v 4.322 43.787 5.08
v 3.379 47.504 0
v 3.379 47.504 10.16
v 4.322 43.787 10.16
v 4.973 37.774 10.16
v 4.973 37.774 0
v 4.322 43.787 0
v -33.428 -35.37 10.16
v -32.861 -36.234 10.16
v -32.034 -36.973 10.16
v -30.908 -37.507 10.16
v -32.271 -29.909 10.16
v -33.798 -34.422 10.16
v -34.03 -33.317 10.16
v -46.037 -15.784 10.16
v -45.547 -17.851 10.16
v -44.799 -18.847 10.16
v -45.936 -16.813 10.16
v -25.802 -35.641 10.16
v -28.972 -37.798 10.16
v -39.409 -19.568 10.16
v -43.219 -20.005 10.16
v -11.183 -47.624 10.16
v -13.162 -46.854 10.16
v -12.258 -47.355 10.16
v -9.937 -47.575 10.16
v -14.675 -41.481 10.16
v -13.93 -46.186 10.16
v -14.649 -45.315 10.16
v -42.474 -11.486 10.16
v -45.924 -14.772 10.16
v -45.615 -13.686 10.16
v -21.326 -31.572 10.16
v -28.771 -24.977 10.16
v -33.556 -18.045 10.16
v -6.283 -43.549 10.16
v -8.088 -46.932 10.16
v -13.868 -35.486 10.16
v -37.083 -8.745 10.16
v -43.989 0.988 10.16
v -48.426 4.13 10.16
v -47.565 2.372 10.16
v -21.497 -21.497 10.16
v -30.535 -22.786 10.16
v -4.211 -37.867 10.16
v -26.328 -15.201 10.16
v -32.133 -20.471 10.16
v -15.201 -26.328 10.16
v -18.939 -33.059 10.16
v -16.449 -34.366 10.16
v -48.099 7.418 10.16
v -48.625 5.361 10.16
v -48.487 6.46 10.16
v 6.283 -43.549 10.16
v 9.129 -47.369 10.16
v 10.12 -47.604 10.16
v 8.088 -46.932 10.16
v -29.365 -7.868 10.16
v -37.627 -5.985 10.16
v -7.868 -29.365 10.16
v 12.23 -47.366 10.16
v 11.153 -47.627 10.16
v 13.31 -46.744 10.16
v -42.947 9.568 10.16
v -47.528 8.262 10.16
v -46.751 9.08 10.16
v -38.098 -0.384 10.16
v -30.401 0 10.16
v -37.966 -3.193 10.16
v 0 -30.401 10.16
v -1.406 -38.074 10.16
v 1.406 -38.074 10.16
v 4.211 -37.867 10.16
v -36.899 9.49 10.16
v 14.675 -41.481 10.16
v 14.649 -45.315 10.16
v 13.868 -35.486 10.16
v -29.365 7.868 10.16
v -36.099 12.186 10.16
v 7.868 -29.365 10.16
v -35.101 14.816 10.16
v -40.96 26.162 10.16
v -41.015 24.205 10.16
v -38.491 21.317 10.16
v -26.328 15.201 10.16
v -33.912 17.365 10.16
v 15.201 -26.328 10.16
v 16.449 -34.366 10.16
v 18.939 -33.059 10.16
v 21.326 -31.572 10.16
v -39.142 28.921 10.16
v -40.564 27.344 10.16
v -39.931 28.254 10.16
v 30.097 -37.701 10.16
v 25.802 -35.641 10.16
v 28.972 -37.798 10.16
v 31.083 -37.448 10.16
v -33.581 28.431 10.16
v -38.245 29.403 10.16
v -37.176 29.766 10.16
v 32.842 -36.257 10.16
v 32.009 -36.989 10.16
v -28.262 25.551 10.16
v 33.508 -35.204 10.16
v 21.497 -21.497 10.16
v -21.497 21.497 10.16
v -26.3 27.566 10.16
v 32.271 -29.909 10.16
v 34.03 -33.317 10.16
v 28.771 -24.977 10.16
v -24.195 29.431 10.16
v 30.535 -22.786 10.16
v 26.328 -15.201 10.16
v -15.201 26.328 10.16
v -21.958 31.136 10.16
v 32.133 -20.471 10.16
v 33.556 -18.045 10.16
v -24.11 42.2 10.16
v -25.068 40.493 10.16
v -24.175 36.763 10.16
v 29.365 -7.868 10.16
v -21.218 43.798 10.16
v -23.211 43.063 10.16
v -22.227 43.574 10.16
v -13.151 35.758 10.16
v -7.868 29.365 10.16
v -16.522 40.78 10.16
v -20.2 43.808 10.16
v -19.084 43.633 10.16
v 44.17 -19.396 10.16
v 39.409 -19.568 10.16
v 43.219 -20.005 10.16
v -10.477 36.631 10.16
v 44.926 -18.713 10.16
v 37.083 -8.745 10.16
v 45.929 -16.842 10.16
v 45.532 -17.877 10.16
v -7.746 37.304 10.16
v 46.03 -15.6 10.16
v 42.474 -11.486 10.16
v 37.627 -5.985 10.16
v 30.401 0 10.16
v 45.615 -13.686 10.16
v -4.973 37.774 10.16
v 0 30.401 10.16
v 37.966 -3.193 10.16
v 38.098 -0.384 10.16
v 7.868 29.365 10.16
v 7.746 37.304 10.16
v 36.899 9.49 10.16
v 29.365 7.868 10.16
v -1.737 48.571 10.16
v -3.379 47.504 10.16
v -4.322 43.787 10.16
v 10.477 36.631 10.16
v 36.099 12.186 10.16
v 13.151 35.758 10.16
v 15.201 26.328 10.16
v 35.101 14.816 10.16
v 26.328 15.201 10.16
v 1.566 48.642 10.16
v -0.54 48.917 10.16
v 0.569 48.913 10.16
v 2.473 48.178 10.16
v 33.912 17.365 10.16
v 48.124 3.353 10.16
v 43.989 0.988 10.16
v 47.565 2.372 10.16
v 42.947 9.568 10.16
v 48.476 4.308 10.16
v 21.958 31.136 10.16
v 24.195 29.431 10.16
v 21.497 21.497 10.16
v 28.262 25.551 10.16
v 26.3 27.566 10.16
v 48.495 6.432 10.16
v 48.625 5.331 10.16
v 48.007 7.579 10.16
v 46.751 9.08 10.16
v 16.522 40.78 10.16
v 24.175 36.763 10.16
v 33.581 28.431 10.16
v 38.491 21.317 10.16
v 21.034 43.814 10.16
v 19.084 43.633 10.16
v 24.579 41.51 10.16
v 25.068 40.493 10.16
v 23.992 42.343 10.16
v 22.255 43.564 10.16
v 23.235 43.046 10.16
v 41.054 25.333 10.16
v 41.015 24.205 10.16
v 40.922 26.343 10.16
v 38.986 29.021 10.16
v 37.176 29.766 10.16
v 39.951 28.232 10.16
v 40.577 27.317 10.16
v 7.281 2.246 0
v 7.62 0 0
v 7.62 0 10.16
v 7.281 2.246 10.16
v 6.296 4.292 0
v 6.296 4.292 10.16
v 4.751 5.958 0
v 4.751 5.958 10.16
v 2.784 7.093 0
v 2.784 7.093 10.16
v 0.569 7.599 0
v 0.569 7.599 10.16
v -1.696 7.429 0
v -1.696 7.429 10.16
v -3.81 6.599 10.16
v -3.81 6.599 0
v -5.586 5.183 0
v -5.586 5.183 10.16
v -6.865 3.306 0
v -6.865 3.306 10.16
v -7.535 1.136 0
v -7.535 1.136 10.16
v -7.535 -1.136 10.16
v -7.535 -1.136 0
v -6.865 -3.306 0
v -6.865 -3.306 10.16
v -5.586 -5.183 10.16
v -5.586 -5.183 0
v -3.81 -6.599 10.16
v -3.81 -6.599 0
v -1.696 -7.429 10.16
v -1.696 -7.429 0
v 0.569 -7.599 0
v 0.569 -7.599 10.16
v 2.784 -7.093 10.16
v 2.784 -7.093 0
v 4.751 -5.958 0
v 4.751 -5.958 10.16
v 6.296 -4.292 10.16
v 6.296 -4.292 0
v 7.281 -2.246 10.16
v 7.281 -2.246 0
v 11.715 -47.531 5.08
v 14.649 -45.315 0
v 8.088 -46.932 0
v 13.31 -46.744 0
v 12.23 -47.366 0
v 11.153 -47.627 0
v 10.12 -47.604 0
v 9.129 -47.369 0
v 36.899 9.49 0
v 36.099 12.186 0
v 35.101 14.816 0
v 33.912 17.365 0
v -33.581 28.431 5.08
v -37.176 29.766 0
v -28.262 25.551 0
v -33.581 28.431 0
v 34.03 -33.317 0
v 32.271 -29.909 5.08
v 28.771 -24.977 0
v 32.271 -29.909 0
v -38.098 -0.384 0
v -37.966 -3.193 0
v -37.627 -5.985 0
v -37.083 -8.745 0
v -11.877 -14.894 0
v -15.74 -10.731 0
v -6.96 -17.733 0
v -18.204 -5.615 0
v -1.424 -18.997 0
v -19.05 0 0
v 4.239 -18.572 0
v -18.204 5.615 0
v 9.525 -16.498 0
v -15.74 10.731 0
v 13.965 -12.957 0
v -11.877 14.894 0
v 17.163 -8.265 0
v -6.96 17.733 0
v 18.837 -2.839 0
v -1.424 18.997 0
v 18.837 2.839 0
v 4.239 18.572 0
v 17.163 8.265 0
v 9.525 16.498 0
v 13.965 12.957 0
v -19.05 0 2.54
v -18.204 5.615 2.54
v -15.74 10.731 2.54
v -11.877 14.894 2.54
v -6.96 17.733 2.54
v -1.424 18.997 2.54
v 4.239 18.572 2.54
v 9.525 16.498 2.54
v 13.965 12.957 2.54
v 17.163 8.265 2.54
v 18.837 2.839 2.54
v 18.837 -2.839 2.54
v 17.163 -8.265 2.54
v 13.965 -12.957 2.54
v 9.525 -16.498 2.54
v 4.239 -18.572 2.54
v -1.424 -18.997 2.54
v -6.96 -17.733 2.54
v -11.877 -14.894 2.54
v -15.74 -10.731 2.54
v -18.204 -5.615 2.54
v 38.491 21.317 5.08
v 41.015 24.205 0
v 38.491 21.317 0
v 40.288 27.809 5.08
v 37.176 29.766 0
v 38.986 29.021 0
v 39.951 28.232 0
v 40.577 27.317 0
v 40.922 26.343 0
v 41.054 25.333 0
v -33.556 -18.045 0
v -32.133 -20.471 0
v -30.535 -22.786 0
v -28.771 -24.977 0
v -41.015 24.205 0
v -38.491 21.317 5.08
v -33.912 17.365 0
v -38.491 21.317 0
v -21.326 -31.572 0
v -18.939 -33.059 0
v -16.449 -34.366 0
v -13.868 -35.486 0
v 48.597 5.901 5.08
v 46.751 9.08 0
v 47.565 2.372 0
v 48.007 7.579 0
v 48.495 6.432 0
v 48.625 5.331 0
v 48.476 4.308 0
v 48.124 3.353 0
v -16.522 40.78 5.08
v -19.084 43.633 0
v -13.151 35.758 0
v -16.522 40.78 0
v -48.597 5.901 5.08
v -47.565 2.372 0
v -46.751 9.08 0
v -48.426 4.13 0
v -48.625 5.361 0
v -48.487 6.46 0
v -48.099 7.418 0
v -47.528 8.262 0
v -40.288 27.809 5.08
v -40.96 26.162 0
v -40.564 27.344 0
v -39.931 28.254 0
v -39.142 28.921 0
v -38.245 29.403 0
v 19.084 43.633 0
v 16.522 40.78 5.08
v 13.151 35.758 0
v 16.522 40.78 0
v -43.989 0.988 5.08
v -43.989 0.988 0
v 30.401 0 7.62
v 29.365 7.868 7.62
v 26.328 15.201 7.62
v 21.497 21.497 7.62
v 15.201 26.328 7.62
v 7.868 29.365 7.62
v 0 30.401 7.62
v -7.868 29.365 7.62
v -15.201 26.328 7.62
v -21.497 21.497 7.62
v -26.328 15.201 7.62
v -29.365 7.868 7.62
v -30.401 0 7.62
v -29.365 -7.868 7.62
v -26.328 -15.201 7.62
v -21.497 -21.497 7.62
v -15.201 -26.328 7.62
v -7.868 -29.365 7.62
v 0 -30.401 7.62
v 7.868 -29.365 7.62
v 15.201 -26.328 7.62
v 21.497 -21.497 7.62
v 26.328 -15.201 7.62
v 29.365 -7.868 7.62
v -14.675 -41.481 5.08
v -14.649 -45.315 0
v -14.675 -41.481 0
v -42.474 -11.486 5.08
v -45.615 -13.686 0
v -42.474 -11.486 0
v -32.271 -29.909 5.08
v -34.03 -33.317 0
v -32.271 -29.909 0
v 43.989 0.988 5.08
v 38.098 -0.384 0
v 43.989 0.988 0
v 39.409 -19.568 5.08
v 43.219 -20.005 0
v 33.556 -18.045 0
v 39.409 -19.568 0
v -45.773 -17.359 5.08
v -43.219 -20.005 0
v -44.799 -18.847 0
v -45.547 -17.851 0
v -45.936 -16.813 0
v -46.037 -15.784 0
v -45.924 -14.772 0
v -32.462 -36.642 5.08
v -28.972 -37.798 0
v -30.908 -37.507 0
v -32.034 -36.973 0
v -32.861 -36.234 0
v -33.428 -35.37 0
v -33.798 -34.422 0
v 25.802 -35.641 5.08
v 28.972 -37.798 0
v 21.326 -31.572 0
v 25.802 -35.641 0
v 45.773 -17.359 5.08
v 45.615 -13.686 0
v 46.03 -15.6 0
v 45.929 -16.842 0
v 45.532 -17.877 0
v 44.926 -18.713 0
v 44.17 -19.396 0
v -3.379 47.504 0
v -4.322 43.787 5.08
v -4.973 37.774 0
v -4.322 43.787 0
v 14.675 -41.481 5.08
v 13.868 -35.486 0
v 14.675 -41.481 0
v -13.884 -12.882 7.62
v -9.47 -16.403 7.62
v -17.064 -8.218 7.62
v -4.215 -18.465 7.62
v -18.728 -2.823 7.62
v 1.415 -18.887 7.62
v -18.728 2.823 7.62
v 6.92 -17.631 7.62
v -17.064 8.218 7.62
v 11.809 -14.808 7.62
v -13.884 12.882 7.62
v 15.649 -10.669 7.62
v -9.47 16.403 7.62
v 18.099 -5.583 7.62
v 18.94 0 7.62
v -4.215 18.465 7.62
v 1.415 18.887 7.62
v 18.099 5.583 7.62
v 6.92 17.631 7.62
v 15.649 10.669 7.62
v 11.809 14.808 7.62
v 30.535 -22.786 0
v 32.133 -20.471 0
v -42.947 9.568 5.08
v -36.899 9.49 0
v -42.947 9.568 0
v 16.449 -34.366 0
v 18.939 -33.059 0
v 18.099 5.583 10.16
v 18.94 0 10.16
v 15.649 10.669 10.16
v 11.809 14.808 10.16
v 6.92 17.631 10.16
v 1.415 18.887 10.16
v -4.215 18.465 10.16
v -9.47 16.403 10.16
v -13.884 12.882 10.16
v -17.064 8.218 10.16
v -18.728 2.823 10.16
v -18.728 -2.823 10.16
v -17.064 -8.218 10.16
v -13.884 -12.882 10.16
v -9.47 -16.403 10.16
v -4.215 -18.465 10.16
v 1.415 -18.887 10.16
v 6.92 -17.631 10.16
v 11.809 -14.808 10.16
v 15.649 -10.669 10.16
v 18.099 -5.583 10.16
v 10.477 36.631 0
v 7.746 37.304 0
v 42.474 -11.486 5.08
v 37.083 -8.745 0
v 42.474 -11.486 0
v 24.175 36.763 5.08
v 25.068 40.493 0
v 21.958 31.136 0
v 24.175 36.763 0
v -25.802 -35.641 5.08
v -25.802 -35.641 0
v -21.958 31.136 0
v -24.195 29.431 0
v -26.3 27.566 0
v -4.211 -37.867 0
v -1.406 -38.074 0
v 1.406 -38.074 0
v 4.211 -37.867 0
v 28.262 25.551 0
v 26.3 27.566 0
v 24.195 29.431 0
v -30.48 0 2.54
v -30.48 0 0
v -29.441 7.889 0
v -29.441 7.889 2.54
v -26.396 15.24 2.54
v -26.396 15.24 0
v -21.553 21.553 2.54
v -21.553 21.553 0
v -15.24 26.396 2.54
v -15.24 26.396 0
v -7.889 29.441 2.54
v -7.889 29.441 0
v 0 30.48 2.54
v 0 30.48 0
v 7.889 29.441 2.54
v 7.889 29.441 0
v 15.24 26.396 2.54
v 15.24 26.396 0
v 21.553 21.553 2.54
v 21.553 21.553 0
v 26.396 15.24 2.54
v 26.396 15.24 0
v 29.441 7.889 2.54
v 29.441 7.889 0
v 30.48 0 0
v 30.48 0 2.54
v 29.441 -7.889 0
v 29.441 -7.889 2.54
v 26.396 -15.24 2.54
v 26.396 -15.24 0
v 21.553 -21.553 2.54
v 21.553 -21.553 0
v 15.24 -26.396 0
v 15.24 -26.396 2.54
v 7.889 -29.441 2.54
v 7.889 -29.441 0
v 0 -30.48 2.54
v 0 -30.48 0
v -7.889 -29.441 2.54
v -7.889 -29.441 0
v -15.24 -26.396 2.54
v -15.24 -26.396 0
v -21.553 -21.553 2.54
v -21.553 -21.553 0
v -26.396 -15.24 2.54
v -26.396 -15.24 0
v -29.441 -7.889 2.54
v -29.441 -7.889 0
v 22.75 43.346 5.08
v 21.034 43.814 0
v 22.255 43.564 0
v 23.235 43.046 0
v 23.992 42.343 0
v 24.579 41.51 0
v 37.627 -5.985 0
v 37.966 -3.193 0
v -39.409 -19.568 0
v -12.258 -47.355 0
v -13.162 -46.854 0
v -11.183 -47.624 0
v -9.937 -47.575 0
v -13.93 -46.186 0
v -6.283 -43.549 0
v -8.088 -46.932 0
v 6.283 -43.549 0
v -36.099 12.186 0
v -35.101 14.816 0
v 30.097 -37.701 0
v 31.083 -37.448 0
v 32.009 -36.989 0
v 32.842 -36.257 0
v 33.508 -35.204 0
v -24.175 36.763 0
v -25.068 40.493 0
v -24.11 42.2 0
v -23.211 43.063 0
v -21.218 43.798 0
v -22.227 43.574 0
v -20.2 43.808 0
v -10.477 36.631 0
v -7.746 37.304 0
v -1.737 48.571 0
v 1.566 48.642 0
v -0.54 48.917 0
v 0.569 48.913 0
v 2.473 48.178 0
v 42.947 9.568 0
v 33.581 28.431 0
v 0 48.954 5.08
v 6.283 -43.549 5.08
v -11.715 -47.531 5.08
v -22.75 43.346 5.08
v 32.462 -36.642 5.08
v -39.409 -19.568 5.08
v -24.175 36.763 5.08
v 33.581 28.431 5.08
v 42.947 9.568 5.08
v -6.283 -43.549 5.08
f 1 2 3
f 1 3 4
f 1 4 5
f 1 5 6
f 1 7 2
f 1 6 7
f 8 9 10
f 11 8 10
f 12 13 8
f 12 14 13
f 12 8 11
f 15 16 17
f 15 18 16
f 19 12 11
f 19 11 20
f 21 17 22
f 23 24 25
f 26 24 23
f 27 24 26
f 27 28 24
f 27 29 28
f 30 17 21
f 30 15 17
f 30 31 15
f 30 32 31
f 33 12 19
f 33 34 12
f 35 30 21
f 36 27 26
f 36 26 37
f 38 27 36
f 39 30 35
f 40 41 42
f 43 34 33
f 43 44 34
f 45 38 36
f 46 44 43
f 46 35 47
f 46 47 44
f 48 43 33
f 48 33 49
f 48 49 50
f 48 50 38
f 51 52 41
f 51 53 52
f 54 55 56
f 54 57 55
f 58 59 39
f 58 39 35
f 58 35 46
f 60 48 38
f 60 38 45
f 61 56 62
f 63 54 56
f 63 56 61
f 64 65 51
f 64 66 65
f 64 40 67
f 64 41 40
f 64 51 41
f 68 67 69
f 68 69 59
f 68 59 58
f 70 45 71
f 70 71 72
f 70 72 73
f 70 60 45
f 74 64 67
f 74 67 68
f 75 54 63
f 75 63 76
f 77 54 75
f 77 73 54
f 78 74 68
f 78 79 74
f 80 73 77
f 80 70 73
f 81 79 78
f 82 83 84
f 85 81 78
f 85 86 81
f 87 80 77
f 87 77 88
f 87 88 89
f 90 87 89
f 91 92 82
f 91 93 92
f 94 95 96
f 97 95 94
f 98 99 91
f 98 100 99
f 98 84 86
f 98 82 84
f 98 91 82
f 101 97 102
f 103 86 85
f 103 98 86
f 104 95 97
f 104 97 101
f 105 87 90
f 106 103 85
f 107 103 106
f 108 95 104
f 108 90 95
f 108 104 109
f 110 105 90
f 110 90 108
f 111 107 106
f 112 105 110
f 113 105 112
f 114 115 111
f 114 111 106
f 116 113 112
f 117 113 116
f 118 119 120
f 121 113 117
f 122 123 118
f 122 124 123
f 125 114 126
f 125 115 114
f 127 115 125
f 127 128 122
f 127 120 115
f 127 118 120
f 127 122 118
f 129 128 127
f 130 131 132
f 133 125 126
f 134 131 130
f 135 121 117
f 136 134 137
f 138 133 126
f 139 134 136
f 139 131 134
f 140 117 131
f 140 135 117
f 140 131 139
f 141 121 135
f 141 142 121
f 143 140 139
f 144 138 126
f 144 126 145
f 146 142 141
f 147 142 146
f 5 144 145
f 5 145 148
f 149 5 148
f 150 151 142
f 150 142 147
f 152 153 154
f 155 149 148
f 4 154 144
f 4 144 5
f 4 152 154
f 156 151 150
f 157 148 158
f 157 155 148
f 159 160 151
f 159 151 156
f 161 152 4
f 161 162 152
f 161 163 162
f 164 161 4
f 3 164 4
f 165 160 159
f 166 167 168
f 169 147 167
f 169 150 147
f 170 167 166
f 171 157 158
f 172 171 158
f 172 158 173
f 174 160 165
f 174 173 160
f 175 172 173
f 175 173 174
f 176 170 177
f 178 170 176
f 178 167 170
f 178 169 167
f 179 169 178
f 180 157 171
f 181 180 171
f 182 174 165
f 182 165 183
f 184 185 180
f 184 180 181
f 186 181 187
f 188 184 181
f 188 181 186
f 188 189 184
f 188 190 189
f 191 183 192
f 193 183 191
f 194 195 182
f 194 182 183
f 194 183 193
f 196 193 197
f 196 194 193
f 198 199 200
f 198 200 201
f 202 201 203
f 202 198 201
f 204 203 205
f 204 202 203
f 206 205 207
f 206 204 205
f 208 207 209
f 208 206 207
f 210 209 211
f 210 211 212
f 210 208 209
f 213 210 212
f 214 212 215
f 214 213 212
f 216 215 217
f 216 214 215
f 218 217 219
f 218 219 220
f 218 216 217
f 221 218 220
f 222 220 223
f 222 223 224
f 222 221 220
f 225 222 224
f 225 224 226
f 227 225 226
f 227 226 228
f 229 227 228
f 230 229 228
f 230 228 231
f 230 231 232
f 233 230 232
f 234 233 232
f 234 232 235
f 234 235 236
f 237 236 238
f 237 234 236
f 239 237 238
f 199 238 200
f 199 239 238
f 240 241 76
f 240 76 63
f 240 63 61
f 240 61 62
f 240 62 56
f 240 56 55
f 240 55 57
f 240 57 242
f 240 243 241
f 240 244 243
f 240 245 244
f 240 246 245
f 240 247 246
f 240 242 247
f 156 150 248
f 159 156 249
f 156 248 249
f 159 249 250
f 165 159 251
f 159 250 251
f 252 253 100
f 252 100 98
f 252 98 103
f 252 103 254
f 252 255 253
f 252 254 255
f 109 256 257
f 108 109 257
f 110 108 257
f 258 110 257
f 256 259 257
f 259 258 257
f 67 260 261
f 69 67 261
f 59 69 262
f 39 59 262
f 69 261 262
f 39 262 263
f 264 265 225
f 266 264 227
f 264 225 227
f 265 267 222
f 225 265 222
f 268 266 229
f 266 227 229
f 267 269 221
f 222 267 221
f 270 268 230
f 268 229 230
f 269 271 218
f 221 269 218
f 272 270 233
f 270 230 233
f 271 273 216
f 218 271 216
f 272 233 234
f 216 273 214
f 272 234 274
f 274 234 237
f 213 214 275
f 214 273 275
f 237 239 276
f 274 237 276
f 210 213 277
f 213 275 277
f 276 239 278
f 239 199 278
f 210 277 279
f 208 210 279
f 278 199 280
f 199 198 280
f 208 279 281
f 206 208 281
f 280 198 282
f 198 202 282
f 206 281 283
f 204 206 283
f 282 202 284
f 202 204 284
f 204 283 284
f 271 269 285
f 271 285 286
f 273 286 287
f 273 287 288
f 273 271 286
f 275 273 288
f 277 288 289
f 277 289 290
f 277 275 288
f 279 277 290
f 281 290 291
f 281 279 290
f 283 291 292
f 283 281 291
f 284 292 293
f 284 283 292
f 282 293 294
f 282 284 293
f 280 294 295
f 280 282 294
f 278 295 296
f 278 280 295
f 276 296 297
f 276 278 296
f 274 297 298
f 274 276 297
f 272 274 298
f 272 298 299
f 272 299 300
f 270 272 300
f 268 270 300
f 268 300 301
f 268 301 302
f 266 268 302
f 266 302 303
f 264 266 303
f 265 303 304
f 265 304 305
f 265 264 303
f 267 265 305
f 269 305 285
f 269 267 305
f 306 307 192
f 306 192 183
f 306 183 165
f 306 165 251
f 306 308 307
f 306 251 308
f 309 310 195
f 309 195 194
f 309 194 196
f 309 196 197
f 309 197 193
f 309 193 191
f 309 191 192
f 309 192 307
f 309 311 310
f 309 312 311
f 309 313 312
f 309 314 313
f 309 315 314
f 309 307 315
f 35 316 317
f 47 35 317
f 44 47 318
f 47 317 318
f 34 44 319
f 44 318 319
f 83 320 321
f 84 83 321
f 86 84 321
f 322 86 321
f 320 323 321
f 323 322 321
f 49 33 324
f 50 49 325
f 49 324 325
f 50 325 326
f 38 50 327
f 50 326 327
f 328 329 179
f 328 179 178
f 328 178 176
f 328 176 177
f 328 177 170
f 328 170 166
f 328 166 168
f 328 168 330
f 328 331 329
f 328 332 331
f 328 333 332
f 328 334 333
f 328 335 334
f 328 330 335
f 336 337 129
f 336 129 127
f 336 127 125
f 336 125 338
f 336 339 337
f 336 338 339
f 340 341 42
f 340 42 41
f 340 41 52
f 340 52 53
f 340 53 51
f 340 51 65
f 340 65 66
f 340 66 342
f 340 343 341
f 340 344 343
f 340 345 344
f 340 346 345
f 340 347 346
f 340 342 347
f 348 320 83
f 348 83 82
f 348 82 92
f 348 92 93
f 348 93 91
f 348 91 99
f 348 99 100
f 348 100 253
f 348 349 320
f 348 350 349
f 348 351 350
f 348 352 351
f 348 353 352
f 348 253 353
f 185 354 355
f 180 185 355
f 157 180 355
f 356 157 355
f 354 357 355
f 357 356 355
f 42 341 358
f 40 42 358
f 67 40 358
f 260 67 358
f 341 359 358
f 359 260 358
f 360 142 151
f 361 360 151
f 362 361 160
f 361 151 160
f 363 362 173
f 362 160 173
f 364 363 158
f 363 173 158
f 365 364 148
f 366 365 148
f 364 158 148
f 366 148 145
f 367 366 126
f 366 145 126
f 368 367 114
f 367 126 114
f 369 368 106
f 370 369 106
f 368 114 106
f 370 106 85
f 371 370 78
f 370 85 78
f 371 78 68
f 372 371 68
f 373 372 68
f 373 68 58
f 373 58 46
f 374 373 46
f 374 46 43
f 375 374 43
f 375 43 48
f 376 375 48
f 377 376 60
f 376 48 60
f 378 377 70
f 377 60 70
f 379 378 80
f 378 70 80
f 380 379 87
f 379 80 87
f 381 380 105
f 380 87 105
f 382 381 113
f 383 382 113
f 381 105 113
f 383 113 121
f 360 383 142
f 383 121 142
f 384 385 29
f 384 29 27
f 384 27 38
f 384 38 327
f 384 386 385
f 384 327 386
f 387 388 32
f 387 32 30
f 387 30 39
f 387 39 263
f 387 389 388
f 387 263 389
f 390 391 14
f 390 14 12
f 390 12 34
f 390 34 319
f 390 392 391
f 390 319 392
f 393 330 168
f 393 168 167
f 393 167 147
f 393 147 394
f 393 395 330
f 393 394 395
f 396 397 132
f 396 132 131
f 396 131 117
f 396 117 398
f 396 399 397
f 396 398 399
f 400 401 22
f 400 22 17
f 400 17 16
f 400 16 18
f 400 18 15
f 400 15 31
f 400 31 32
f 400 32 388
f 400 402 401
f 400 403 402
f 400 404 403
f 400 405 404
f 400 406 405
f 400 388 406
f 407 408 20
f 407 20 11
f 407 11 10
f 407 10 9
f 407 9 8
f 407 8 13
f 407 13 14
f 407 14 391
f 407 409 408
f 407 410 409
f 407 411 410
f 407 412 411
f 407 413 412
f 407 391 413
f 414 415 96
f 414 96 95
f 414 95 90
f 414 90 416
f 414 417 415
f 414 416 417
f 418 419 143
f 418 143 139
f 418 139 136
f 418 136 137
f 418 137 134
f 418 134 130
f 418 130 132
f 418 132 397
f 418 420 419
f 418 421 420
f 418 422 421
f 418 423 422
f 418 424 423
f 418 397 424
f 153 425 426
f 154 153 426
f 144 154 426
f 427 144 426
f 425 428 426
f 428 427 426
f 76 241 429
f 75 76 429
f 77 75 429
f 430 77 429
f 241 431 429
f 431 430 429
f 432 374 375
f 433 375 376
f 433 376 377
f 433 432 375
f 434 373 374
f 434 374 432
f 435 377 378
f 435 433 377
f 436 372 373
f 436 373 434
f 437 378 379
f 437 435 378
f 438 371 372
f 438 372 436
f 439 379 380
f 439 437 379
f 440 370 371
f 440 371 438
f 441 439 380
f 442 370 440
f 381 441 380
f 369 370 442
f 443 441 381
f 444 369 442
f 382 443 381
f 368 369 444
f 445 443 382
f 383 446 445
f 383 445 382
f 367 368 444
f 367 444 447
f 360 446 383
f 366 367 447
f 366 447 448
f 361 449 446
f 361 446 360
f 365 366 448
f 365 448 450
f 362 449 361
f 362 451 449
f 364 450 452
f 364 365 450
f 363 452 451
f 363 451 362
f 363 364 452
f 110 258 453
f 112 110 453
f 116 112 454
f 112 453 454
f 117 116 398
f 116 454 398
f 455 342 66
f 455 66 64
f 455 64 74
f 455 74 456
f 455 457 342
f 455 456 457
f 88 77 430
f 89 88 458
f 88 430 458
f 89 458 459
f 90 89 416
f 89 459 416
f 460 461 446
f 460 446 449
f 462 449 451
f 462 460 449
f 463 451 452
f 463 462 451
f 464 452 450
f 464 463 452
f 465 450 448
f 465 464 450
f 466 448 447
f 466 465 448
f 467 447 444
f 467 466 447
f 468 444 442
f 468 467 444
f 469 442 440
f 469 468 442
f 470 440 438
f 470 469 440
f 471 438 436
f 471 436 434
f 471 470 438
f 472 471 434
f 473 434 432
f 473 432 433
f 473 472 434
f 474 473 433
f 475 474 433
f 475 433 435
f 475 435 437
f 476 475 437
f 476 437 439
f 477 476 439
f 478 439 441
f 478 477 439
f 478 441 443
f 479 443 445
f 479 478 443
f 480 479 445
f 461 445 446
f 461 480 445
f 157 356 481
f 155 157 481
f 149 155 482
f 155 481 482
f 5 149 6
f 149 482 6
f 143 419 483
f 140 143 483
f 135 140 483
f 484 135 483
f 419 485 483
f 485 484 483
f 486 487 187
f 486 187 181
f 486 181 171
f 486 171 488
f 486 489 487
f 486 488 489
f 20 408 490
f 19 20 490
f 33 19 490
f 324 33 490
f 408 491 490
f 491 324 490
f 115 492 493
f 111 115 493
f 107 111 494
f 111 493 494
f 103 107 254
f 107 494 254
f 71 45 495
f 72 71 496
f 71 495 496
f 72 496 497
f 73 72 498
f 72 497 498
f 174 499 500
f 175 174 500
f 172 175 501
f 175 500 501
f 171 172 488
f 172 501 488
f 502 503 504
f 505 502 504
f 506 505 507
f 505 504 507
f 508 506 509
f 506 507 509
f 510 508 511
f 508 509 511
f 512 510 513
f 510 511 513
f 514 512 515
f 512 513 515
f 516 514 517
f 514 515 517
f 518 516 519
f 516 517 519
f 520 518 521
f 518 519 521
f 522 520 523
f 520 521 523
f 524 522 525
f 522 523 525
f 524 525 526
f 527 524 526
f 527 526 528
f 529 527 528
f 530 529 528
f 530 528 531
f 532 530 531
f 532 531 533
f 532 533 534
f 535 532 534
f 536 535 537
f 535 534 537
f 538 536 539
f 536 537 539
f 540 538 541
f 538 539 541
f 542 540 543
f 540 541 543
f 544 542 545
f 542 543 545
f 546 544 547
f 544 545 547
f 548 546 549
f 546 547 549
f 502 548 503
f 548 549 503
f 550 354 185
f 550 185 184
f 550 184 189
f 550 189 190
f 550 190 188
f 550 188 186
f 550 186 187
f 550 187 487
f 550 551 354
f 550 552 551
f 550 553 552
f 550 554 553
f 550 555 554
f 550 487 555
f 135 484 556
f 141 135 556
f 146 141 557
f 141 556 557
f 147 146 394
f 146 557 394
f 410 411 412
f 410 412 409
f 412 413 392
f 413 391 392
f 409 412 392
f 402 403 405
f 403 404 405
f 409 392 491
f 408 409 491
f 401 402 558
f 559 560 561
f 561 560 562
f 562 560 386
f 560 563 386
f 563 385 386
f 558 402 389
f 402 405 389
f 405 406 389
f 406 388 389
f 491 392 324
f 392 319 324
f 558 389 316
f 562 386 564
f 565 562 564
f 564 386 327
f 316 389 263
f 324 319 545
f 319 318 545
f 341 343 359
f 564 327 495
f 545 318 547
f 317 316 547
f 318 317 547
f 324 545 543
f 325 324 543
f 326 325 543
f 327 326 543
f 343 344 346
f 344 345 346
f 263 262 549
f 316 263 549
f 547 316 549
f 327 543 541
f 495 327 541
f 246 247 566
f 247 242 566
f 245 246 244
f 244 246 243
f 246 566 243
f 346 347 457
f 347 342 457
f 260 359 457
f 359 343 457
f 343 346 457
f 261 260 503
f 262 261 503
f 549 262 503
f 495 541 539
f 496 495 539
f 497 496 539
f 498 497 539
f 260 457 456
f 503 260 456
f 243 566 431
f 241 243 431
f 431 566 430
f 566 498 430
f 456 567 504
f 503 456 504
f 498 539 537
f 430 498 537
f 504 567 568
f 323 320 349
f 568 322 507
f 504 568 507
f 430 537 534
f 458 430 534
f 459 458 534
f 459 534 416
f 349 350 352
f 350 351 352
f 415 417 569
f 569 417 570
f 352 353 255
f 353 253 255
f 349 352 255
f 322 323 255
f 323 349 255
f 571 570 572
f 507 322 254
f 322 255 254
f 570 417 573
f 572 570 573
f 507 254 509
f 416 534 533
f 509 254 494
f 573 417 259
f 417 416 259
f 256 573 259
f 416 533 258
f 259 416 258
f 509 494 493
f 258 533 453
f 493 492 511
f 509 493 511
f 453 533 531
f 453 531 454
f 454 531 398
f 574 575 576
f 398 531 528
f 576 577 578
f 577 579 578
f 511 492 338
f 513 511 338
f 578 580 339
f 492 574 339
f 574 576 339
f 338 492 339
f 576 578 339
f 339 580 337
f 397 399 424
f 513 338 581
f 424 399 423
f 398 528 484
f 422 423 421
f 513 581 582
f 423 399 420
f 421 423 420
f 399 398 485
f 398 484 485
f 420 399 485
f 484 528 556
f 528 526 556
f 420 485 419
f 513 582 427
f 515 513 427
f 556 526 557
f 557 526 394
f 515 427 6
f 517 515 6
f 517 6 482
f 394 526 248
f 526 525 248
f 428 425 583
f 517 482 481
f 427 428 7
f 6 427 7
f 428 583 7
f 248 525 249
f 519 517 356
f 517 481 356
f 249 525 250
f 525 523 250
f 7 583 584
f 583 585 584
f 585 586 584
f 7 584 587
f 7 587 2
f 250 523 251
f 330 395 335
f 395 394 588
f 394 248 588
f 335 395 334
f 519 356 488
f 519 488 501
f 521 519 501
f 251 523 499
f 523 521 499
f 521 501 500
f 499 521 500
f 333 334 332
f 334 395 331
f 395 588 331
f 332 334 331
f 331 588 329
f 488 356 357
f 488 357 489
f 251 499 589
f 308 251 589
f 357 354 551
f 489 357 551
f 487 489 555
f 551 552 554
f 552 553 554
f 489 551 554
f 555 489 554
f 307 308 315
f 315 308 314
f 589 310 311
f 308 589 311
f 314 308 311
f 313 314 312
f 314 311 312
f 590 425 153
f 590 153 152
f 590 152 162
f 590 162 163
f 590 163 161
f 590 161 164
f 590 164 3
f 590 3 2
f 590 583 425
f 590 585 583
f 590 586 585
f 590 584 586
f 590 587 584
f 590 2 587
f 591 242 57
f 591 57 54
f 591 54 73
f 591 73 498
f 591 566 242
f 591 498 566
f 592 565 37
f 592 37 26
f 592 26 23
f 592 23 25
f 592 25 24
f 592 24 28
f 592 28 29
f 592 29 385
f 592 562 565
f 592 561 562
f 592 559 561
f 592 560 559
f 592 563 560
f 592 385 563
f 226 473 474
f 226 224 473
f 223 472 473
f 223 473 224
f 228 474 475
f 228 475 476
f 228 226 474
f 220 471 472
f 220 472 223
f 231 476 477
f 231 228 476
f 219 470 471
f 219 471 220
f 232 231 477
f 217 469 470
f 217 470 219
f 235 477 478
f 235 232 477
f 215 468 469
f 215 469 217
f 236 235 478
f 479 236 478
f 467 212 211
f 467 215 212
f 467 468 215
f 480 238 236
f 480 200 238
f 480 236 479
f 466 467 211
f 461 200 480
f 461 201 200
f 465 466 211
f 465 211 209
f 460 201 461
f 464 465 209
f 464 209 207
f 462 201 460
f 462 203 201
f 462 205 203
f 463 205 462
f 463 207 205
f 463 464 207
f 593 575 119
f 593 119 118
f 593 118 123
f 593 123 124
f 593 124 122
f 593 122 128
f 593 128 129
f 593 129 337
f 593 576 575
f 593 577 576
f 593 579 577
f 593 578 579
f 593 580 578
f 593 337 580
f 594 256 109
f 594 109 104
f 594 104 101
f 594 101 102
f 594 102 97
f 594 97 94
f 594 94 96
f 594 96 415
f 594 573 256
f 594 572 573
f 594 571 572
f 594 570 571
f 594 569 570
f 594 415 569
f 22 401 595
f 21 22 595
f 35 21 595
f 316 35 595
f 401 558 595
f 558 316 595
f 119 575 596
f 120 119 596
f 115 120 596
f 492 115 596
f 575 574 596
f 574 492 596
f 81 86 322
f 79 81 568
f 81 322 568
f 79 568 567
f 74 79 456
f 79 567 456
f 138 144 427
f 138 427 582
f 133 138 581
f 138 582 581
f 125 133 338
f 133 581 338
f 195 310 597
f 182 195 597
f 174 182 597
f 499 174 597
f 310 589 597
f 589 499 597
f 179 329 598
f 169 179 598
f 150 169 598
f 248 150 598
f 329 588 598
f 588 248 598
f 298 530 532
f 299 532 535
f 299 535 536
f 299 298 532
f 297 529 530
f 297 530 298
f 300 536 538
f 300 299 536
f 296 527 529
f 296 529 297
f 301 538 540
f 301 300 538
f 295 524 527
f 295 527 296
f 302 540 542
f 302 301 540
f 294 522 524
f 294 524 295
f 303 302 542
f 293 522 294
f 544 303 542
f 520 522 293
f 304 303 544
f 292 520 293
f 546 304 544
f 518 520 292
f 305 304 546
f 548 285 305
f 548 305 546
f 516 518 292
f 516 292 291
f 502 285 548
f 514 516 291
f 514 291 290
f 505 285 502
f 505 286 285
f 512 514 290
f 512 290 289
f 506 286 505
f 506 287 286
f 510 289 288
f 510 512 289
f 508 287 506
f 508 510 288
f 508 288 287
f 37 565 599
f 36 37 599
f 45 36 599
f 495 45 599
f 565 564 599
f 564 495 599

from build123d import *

# Parameters (mm, degrees)
SKETCH1_R           = 7.62
BOSS_EXTRUDE2_DEPTH = 10.16
SKETCH2_R           = 30.48
SKETCH2_R_2         = 19.05
CUT_EXTRUDE1_DEPTH  = 2.54
SKETCH4_R           = 30.401229143
SKETCH4_R_2         = 18.940015454
CUT_EXTRUDE3_DEPTH  = 2.54


with BuildPart() as part:
    # Sketch1 → Boss-Extrude2 (new body)
    with BuildSketch(Plane.XY):
        with BuildLine():
            ThreePointArc((-4.973047924, 37.774049218), (-9.117926809, 36.992883244), (-13.151060724, 35.758350099))
            add(Edge.make_bspline(
                [(-19.084474431, 43.633182282), (-16.926977066, 41.864131326), (-13.151060724, 35.758350099)],
                knots=[0, 0, 0, 1, 1, 1], degree=2))
            add(Edge.make_bspline(
                [(-25.068187902, 40.492687188), (-23.423529412, 44.629806533), (-19.084474431, 43.633182282)],
                knots=[0, 0, 0, 1, 1, 1], degree=2))
            add(Edge.make_bspline(
                [(-25.068187902, 40.492687188), (-24.837885701, 37.712166182), (-21.957891223, 31.136168888)],
                knots=[0, 0, 0, 1, 1, 1], degree=2))
            ThreePointArc((-21.957891223, 31.136168888), (-25.264973279, 28.518259505), (-28.262419847, 25.550843908))
            add(Edge.make_bspline(
                [(-37.175813758, 29.766266676), (-34.443325744, 29.202488866), (-28.262419847, 25.550843908)],
                knots=[0, 0, 0, 1, 1, 1], degree=2))
            add(Edge.make_bspline(
                [(-41.014668065, 24.204726066), (-41.481010519, 28.63227423), (-37.175813758, 29.766266676)],
                knots=[0, 0, 0, 1, 1, 1], degree=2))
            add(Edge.make_bspline(
                [(-41.014668065, 24.204726066), (-39.518573051, 21.849723757), (-33.912446265, 17.365367497)],
                knots=[0, 0, 0, 1, 1, 1], degree=2))
            ThreePointArc((-33.912446265, 17.365367497), (-35.624118846, 13.510446196), (-36.899199182, 9.489947298))
            add(Edge.make_bspline(
                [(-46.75062217, 9.080258097), (-44.069123581, 9.850908135), (-36.899199182, 9.489947298)],
                knots=[0, 0, 0, 1, 1, 1], degree=2))
            add(Edge.make_bspline(
                [(-47.565182054, 2.371753901), (-50.035692017, 6.075432957), (-46.75062217, 9.080258097)],
                knots=[0, 0, 0, 1, 1, 1], degree=2))
            add(Edge.make_bspline(
                [(-47.565182054, 2.371753901), (-45.146031566, 0.981772936), (-38.098068557, -0.383630312)],
                knots=[0, 0, 0, 1, 1, 1], degree=2))
            ThreePointArc((-38.098068557, -0.383630312), (-37.822208103, -4.592447518), (-37.082816668, -8.744981872))
            add(Edge.make_bspline(
                [(-45.615426449, -13.685928184), (-43.599216296, -11.757396933), (-37.082816668, -8.744981872)],
                knots=[0, 0, 0, 1, 1, 1], degree=2))
            add(Edge.make_bspline(
                [(-43.219086057, -20.0045585), (-47.12779947, -17.87321679), (-45.615426449, -13.685928184)],
                knots=[0, 0, 0, 1, 1, 1], degree=2))
            add(Edge.make_bspline(
                [(-43.219086057, -20.0045585), (-40.431078318, -20.111090232), (-33.555882474, -18.04474304)],
                knots=[0, 0, 0, 1, 1, 1], degree=2))
            ThreePointArc((-33.555882474, -18.04474304), (-31.355685291, -21.64326685), (-28.771207752, -24.976541083))
            add(Edge.make_bspline(
                [(-34.030286254, -33.31683325), (-33.141253985, -30.672224056), (-28.771207752, -24.976541083)],
                knots=[0, 0, 0, 1, 1, 1], degree=2))
            add(Edge.make_bspline(
                [(-28.972018291, -37.798067629), (-33.423496015, -37.727327965), (-34.030286254, -33.31683325)],
                knots=[0, 0, 0, 1, 1, 1], degree=2))
            add(Edge.make_bspline(
                [(-28.972018291, -37.798067629), (-26.453852274, -36.596744994), (-21.326448108, -31.572022601)],
                knots=[0, 0, 0, 1, 1, 1], degree=2))
            ThreePointArc((-21.326448108, -31.572022601), (-17.705952855, -33.735874577), (-13.868461871, -35.486275732))
            add(Edge.make_bspline(
                [(-14.649217588, -45.315253331), (-15.091029782, -42.560414288), (-13.868461871, -35.486275732)],
                knots=[0, 0, 0, 1, 1, 1], degree=2))
            add(Edge.make_bspline(
                [(-8.087810285, -46.932494981), (-12.06227242, -48.938562968), (-14.649217588, -45.315253331)],
                knots=[0, 0, 0, 1, 1, 1], degree=2))
            add(Edge.make_bspline(
                [(-8.087810285, -46.932494981), (-6.416367478, -44.698526515), (-4.211381492, -37.866532267)],
                knots=[0, 0, 0, 1, 1, 1], degree=2))
            ThreePointArc((-4.211381492, -37.866532267), (0, -38.1), (4.211381492, -37.866532267))
            add(Edge.make_bspline(
                [(8.087810285, -46.932494981), (6.416367478, -44.698526515), (4.211381492, -37.866532267)],
                knots=[0, 0, 0, 1, 1, 1], degree=2))
            add(Edge.make_bspline(
                [(14.649217588, -45.315253331), (12.06227242, -48.938562968), (8.087810285, -46.932494981)],
                knots=[0, 0, 0, 1, 1, 1], degree=2))
            add(Edge.make_bspline(
                [(14.649217588, -45.315253331), (15.091029782, -42.560414288), (13.868461871, -35.486275732)],
                knots=[0, 0, 0, 1, 1, 1], degree=2))
            ThreePointArc((13.868461871, -35.486275732), (17.705952855, -33.735874577), (21.326448108, -31.572022601))
            add(Edge.make_bspline(
                [(28.972018291, -37.798067629), (26.453852274, -36.596744994), (21.326448108, -31.572022601)],
                knots=[0, 0, 0, 1, 1, 1], degree=2))
            add(Edge.make_bspline(
                [(34.030286254, -33.31683325), (33.423496015, -37.727327965), (28.972018291, -37.798067629)],
                knots=[0, 0, 0, 1, 1, 1], degree=2))
            add(Edge.make_bspline(
                [(34.030286254, -33.31683325), (33.141253985, -30.672224056), (28.771207752, -24.976541083)],
                knots=[0, 0, 0, 1, 1, 1], degree=2))
            ThreePointArc((28.771207752, -24.976541083), (31.355685291, -21.64326685), (33.555882474, -18.04474304))
            add(Edge.make_bspline(
                [(43.219086057, -20.0045585), (40.431078318, -20.111090232), (33.555882474, -18.04474304)],
                knots=[0, 0, 0, 1, 1, 1], degree=2))
            add(Edge.make_bspline(
                [(45.615426449, -13.685928184), (47.12779947, -17.87321679), (43.219086057, -20.0045585)],
                knots=[0, 0, 0, 1, 1, 1], degree=2))
            add(Edge.make_bspline(
                [(45.615426449, -13.685928184), (43.599216296, -11.757396933), (37.082816668, -8.744981872)],
                knots=[0, 0, 0, 1, 1, 1], degree=2))
            ThreePointArc((37.082816668, -8.744981872), (37.822208103, -4.592447518), (38.098068557, -0.383630312))
            add(Edge.make_bspline(
                [(47.565182054, 2.371753901), (45.146031566, 0.981772936), (38.098068557, -0.383630312)],
                knots=[0, 0, 0, 1, 1, 1], degree=2))
            add(Edge.make_bspline(
                [(46.75062217, 9.080258097), (50.035692017, 6.075432957), (47.565182054, 2.371753901)],
                knots=[0, 0, 0, 1, 1, 1], degree=2))
            add(Edge.make_bspline(
                [(46.75062217, 9.080258097), (44.069123581, 9.850908135), (36.899199182, 9.489947298)],
                knots=[0, 0, 0, 1, 1, 1], degree=2))
            ThreePointArc((36.899199182, 9.489947298), (35.624118846, 13.510446196), (33.912446265, 17.365367497))
            add(Edge.make_bspline(
                [(41.014668065, 24.204726066), (39.518573051, 21.849723757), (33.912446265, 17.365367497)],
                knots=[0, 0, 0, 1, 1, 1], degree=2))
            add(Edge.make_bspline(
                [(37.175813758, 29.766266676), (41.481010519, 28.63227423), (41.014668065, 24.204726066)],
                knots=[0, 0, 0, 1, 1, 1], degree=2))
            add(Edge.make_bspline(
                [(37.175813758, 29.766266676), (34.443325744, 29.202488866), (28.262419847, 25.550843908)],
                knots=[0, 0, 0, 1, 1, 1], degree=2))
            ThreePointArc((28.262419847, 25.550843908), (25.264973279, 28.518259505), (21.957891223, 31.136168888))
            add(Edge.make_bspline(
                [(25.068187902, 40.492687188), (24.837885701, 37.712166182), (21.957891223, 31.136168888)],
                knots=[0, 0, 0, 1, 1, 1], degree=2))
            add(Edge.make_bspline(
                [(19.084474431, 43.633182282), (23.423529412, 44.629806533), (25.068187902, 40.492687188)],
                knots=[0, 0, 0, 1, 1, 1], degree=2))
            add(Edge.make_bspline(
                [(19.084474431, 43.633182282), (16.926977066, 41.864131326), (13.151060724, 35.758350099)],
                knots=[0, 0, 0, 1, 1, 1], degree=2))
            ThreePointArc((13.151060724, 35.758350099), (9.117926809, 36.992883244), (4.973047924, 37.774049218))
            add(Edge.make_bspline(
                [(3.378887996, 47.504261665), (4.467138065, 44.935205816), (4.973047924, 37.774049218)],
                knots=[0, 0, 0, 1, 1, 1], degree=2))
            add(Edge.make_bspline(
                [(-3.378887996, 47.504261665), (0, 50.403188007), (3.378887996, 47.504261665)],
                knots=[0, 0, 0, 1, 1, 1], degree=2))
            add(Edge.make_bspline(
                [(-3.378887996, 47.504261665), (-4.467138065, 44.935205816), (-4.973047924, 37.774049218)],
                knots=[0, 0, 0, 1, 1, 1], degree=2))
        make_face()
        Circle(SKETCH1_R, mode=Mode.SUBTRACT)
    extrude(amount=BOSS_EXTRUDE2_DEPTH)

    # Sketch2 → Cut-Extrude1 (cut)
    with BuildSketch(Plane(origin=(0, 0, 0), x_dir=(-1, 0, 0), z_dir=(0, 0, -1))):
        Circle(SKETCH2_R)
        Circle(SKETCH2_R_2, mode=Mode.SUBTRACT)
    extrude(amount=-CUT_EXTRUDE1_DEPTH, mode=Mode.SUBTRACT)

    # Sketch4 → Cut-Extrude3 (cut)
    with BuildSketch(Plane.XY.offset(10.16)):
        Circle(SKETCH4_R)
        Circle(SKETCH4_R_2, mode=Mode.SUBTRACT)
    extrude(amount=-CUT_EXTRUDE3_DEPTH, mode=Mode.SUBTRACT)


solid = part.part
